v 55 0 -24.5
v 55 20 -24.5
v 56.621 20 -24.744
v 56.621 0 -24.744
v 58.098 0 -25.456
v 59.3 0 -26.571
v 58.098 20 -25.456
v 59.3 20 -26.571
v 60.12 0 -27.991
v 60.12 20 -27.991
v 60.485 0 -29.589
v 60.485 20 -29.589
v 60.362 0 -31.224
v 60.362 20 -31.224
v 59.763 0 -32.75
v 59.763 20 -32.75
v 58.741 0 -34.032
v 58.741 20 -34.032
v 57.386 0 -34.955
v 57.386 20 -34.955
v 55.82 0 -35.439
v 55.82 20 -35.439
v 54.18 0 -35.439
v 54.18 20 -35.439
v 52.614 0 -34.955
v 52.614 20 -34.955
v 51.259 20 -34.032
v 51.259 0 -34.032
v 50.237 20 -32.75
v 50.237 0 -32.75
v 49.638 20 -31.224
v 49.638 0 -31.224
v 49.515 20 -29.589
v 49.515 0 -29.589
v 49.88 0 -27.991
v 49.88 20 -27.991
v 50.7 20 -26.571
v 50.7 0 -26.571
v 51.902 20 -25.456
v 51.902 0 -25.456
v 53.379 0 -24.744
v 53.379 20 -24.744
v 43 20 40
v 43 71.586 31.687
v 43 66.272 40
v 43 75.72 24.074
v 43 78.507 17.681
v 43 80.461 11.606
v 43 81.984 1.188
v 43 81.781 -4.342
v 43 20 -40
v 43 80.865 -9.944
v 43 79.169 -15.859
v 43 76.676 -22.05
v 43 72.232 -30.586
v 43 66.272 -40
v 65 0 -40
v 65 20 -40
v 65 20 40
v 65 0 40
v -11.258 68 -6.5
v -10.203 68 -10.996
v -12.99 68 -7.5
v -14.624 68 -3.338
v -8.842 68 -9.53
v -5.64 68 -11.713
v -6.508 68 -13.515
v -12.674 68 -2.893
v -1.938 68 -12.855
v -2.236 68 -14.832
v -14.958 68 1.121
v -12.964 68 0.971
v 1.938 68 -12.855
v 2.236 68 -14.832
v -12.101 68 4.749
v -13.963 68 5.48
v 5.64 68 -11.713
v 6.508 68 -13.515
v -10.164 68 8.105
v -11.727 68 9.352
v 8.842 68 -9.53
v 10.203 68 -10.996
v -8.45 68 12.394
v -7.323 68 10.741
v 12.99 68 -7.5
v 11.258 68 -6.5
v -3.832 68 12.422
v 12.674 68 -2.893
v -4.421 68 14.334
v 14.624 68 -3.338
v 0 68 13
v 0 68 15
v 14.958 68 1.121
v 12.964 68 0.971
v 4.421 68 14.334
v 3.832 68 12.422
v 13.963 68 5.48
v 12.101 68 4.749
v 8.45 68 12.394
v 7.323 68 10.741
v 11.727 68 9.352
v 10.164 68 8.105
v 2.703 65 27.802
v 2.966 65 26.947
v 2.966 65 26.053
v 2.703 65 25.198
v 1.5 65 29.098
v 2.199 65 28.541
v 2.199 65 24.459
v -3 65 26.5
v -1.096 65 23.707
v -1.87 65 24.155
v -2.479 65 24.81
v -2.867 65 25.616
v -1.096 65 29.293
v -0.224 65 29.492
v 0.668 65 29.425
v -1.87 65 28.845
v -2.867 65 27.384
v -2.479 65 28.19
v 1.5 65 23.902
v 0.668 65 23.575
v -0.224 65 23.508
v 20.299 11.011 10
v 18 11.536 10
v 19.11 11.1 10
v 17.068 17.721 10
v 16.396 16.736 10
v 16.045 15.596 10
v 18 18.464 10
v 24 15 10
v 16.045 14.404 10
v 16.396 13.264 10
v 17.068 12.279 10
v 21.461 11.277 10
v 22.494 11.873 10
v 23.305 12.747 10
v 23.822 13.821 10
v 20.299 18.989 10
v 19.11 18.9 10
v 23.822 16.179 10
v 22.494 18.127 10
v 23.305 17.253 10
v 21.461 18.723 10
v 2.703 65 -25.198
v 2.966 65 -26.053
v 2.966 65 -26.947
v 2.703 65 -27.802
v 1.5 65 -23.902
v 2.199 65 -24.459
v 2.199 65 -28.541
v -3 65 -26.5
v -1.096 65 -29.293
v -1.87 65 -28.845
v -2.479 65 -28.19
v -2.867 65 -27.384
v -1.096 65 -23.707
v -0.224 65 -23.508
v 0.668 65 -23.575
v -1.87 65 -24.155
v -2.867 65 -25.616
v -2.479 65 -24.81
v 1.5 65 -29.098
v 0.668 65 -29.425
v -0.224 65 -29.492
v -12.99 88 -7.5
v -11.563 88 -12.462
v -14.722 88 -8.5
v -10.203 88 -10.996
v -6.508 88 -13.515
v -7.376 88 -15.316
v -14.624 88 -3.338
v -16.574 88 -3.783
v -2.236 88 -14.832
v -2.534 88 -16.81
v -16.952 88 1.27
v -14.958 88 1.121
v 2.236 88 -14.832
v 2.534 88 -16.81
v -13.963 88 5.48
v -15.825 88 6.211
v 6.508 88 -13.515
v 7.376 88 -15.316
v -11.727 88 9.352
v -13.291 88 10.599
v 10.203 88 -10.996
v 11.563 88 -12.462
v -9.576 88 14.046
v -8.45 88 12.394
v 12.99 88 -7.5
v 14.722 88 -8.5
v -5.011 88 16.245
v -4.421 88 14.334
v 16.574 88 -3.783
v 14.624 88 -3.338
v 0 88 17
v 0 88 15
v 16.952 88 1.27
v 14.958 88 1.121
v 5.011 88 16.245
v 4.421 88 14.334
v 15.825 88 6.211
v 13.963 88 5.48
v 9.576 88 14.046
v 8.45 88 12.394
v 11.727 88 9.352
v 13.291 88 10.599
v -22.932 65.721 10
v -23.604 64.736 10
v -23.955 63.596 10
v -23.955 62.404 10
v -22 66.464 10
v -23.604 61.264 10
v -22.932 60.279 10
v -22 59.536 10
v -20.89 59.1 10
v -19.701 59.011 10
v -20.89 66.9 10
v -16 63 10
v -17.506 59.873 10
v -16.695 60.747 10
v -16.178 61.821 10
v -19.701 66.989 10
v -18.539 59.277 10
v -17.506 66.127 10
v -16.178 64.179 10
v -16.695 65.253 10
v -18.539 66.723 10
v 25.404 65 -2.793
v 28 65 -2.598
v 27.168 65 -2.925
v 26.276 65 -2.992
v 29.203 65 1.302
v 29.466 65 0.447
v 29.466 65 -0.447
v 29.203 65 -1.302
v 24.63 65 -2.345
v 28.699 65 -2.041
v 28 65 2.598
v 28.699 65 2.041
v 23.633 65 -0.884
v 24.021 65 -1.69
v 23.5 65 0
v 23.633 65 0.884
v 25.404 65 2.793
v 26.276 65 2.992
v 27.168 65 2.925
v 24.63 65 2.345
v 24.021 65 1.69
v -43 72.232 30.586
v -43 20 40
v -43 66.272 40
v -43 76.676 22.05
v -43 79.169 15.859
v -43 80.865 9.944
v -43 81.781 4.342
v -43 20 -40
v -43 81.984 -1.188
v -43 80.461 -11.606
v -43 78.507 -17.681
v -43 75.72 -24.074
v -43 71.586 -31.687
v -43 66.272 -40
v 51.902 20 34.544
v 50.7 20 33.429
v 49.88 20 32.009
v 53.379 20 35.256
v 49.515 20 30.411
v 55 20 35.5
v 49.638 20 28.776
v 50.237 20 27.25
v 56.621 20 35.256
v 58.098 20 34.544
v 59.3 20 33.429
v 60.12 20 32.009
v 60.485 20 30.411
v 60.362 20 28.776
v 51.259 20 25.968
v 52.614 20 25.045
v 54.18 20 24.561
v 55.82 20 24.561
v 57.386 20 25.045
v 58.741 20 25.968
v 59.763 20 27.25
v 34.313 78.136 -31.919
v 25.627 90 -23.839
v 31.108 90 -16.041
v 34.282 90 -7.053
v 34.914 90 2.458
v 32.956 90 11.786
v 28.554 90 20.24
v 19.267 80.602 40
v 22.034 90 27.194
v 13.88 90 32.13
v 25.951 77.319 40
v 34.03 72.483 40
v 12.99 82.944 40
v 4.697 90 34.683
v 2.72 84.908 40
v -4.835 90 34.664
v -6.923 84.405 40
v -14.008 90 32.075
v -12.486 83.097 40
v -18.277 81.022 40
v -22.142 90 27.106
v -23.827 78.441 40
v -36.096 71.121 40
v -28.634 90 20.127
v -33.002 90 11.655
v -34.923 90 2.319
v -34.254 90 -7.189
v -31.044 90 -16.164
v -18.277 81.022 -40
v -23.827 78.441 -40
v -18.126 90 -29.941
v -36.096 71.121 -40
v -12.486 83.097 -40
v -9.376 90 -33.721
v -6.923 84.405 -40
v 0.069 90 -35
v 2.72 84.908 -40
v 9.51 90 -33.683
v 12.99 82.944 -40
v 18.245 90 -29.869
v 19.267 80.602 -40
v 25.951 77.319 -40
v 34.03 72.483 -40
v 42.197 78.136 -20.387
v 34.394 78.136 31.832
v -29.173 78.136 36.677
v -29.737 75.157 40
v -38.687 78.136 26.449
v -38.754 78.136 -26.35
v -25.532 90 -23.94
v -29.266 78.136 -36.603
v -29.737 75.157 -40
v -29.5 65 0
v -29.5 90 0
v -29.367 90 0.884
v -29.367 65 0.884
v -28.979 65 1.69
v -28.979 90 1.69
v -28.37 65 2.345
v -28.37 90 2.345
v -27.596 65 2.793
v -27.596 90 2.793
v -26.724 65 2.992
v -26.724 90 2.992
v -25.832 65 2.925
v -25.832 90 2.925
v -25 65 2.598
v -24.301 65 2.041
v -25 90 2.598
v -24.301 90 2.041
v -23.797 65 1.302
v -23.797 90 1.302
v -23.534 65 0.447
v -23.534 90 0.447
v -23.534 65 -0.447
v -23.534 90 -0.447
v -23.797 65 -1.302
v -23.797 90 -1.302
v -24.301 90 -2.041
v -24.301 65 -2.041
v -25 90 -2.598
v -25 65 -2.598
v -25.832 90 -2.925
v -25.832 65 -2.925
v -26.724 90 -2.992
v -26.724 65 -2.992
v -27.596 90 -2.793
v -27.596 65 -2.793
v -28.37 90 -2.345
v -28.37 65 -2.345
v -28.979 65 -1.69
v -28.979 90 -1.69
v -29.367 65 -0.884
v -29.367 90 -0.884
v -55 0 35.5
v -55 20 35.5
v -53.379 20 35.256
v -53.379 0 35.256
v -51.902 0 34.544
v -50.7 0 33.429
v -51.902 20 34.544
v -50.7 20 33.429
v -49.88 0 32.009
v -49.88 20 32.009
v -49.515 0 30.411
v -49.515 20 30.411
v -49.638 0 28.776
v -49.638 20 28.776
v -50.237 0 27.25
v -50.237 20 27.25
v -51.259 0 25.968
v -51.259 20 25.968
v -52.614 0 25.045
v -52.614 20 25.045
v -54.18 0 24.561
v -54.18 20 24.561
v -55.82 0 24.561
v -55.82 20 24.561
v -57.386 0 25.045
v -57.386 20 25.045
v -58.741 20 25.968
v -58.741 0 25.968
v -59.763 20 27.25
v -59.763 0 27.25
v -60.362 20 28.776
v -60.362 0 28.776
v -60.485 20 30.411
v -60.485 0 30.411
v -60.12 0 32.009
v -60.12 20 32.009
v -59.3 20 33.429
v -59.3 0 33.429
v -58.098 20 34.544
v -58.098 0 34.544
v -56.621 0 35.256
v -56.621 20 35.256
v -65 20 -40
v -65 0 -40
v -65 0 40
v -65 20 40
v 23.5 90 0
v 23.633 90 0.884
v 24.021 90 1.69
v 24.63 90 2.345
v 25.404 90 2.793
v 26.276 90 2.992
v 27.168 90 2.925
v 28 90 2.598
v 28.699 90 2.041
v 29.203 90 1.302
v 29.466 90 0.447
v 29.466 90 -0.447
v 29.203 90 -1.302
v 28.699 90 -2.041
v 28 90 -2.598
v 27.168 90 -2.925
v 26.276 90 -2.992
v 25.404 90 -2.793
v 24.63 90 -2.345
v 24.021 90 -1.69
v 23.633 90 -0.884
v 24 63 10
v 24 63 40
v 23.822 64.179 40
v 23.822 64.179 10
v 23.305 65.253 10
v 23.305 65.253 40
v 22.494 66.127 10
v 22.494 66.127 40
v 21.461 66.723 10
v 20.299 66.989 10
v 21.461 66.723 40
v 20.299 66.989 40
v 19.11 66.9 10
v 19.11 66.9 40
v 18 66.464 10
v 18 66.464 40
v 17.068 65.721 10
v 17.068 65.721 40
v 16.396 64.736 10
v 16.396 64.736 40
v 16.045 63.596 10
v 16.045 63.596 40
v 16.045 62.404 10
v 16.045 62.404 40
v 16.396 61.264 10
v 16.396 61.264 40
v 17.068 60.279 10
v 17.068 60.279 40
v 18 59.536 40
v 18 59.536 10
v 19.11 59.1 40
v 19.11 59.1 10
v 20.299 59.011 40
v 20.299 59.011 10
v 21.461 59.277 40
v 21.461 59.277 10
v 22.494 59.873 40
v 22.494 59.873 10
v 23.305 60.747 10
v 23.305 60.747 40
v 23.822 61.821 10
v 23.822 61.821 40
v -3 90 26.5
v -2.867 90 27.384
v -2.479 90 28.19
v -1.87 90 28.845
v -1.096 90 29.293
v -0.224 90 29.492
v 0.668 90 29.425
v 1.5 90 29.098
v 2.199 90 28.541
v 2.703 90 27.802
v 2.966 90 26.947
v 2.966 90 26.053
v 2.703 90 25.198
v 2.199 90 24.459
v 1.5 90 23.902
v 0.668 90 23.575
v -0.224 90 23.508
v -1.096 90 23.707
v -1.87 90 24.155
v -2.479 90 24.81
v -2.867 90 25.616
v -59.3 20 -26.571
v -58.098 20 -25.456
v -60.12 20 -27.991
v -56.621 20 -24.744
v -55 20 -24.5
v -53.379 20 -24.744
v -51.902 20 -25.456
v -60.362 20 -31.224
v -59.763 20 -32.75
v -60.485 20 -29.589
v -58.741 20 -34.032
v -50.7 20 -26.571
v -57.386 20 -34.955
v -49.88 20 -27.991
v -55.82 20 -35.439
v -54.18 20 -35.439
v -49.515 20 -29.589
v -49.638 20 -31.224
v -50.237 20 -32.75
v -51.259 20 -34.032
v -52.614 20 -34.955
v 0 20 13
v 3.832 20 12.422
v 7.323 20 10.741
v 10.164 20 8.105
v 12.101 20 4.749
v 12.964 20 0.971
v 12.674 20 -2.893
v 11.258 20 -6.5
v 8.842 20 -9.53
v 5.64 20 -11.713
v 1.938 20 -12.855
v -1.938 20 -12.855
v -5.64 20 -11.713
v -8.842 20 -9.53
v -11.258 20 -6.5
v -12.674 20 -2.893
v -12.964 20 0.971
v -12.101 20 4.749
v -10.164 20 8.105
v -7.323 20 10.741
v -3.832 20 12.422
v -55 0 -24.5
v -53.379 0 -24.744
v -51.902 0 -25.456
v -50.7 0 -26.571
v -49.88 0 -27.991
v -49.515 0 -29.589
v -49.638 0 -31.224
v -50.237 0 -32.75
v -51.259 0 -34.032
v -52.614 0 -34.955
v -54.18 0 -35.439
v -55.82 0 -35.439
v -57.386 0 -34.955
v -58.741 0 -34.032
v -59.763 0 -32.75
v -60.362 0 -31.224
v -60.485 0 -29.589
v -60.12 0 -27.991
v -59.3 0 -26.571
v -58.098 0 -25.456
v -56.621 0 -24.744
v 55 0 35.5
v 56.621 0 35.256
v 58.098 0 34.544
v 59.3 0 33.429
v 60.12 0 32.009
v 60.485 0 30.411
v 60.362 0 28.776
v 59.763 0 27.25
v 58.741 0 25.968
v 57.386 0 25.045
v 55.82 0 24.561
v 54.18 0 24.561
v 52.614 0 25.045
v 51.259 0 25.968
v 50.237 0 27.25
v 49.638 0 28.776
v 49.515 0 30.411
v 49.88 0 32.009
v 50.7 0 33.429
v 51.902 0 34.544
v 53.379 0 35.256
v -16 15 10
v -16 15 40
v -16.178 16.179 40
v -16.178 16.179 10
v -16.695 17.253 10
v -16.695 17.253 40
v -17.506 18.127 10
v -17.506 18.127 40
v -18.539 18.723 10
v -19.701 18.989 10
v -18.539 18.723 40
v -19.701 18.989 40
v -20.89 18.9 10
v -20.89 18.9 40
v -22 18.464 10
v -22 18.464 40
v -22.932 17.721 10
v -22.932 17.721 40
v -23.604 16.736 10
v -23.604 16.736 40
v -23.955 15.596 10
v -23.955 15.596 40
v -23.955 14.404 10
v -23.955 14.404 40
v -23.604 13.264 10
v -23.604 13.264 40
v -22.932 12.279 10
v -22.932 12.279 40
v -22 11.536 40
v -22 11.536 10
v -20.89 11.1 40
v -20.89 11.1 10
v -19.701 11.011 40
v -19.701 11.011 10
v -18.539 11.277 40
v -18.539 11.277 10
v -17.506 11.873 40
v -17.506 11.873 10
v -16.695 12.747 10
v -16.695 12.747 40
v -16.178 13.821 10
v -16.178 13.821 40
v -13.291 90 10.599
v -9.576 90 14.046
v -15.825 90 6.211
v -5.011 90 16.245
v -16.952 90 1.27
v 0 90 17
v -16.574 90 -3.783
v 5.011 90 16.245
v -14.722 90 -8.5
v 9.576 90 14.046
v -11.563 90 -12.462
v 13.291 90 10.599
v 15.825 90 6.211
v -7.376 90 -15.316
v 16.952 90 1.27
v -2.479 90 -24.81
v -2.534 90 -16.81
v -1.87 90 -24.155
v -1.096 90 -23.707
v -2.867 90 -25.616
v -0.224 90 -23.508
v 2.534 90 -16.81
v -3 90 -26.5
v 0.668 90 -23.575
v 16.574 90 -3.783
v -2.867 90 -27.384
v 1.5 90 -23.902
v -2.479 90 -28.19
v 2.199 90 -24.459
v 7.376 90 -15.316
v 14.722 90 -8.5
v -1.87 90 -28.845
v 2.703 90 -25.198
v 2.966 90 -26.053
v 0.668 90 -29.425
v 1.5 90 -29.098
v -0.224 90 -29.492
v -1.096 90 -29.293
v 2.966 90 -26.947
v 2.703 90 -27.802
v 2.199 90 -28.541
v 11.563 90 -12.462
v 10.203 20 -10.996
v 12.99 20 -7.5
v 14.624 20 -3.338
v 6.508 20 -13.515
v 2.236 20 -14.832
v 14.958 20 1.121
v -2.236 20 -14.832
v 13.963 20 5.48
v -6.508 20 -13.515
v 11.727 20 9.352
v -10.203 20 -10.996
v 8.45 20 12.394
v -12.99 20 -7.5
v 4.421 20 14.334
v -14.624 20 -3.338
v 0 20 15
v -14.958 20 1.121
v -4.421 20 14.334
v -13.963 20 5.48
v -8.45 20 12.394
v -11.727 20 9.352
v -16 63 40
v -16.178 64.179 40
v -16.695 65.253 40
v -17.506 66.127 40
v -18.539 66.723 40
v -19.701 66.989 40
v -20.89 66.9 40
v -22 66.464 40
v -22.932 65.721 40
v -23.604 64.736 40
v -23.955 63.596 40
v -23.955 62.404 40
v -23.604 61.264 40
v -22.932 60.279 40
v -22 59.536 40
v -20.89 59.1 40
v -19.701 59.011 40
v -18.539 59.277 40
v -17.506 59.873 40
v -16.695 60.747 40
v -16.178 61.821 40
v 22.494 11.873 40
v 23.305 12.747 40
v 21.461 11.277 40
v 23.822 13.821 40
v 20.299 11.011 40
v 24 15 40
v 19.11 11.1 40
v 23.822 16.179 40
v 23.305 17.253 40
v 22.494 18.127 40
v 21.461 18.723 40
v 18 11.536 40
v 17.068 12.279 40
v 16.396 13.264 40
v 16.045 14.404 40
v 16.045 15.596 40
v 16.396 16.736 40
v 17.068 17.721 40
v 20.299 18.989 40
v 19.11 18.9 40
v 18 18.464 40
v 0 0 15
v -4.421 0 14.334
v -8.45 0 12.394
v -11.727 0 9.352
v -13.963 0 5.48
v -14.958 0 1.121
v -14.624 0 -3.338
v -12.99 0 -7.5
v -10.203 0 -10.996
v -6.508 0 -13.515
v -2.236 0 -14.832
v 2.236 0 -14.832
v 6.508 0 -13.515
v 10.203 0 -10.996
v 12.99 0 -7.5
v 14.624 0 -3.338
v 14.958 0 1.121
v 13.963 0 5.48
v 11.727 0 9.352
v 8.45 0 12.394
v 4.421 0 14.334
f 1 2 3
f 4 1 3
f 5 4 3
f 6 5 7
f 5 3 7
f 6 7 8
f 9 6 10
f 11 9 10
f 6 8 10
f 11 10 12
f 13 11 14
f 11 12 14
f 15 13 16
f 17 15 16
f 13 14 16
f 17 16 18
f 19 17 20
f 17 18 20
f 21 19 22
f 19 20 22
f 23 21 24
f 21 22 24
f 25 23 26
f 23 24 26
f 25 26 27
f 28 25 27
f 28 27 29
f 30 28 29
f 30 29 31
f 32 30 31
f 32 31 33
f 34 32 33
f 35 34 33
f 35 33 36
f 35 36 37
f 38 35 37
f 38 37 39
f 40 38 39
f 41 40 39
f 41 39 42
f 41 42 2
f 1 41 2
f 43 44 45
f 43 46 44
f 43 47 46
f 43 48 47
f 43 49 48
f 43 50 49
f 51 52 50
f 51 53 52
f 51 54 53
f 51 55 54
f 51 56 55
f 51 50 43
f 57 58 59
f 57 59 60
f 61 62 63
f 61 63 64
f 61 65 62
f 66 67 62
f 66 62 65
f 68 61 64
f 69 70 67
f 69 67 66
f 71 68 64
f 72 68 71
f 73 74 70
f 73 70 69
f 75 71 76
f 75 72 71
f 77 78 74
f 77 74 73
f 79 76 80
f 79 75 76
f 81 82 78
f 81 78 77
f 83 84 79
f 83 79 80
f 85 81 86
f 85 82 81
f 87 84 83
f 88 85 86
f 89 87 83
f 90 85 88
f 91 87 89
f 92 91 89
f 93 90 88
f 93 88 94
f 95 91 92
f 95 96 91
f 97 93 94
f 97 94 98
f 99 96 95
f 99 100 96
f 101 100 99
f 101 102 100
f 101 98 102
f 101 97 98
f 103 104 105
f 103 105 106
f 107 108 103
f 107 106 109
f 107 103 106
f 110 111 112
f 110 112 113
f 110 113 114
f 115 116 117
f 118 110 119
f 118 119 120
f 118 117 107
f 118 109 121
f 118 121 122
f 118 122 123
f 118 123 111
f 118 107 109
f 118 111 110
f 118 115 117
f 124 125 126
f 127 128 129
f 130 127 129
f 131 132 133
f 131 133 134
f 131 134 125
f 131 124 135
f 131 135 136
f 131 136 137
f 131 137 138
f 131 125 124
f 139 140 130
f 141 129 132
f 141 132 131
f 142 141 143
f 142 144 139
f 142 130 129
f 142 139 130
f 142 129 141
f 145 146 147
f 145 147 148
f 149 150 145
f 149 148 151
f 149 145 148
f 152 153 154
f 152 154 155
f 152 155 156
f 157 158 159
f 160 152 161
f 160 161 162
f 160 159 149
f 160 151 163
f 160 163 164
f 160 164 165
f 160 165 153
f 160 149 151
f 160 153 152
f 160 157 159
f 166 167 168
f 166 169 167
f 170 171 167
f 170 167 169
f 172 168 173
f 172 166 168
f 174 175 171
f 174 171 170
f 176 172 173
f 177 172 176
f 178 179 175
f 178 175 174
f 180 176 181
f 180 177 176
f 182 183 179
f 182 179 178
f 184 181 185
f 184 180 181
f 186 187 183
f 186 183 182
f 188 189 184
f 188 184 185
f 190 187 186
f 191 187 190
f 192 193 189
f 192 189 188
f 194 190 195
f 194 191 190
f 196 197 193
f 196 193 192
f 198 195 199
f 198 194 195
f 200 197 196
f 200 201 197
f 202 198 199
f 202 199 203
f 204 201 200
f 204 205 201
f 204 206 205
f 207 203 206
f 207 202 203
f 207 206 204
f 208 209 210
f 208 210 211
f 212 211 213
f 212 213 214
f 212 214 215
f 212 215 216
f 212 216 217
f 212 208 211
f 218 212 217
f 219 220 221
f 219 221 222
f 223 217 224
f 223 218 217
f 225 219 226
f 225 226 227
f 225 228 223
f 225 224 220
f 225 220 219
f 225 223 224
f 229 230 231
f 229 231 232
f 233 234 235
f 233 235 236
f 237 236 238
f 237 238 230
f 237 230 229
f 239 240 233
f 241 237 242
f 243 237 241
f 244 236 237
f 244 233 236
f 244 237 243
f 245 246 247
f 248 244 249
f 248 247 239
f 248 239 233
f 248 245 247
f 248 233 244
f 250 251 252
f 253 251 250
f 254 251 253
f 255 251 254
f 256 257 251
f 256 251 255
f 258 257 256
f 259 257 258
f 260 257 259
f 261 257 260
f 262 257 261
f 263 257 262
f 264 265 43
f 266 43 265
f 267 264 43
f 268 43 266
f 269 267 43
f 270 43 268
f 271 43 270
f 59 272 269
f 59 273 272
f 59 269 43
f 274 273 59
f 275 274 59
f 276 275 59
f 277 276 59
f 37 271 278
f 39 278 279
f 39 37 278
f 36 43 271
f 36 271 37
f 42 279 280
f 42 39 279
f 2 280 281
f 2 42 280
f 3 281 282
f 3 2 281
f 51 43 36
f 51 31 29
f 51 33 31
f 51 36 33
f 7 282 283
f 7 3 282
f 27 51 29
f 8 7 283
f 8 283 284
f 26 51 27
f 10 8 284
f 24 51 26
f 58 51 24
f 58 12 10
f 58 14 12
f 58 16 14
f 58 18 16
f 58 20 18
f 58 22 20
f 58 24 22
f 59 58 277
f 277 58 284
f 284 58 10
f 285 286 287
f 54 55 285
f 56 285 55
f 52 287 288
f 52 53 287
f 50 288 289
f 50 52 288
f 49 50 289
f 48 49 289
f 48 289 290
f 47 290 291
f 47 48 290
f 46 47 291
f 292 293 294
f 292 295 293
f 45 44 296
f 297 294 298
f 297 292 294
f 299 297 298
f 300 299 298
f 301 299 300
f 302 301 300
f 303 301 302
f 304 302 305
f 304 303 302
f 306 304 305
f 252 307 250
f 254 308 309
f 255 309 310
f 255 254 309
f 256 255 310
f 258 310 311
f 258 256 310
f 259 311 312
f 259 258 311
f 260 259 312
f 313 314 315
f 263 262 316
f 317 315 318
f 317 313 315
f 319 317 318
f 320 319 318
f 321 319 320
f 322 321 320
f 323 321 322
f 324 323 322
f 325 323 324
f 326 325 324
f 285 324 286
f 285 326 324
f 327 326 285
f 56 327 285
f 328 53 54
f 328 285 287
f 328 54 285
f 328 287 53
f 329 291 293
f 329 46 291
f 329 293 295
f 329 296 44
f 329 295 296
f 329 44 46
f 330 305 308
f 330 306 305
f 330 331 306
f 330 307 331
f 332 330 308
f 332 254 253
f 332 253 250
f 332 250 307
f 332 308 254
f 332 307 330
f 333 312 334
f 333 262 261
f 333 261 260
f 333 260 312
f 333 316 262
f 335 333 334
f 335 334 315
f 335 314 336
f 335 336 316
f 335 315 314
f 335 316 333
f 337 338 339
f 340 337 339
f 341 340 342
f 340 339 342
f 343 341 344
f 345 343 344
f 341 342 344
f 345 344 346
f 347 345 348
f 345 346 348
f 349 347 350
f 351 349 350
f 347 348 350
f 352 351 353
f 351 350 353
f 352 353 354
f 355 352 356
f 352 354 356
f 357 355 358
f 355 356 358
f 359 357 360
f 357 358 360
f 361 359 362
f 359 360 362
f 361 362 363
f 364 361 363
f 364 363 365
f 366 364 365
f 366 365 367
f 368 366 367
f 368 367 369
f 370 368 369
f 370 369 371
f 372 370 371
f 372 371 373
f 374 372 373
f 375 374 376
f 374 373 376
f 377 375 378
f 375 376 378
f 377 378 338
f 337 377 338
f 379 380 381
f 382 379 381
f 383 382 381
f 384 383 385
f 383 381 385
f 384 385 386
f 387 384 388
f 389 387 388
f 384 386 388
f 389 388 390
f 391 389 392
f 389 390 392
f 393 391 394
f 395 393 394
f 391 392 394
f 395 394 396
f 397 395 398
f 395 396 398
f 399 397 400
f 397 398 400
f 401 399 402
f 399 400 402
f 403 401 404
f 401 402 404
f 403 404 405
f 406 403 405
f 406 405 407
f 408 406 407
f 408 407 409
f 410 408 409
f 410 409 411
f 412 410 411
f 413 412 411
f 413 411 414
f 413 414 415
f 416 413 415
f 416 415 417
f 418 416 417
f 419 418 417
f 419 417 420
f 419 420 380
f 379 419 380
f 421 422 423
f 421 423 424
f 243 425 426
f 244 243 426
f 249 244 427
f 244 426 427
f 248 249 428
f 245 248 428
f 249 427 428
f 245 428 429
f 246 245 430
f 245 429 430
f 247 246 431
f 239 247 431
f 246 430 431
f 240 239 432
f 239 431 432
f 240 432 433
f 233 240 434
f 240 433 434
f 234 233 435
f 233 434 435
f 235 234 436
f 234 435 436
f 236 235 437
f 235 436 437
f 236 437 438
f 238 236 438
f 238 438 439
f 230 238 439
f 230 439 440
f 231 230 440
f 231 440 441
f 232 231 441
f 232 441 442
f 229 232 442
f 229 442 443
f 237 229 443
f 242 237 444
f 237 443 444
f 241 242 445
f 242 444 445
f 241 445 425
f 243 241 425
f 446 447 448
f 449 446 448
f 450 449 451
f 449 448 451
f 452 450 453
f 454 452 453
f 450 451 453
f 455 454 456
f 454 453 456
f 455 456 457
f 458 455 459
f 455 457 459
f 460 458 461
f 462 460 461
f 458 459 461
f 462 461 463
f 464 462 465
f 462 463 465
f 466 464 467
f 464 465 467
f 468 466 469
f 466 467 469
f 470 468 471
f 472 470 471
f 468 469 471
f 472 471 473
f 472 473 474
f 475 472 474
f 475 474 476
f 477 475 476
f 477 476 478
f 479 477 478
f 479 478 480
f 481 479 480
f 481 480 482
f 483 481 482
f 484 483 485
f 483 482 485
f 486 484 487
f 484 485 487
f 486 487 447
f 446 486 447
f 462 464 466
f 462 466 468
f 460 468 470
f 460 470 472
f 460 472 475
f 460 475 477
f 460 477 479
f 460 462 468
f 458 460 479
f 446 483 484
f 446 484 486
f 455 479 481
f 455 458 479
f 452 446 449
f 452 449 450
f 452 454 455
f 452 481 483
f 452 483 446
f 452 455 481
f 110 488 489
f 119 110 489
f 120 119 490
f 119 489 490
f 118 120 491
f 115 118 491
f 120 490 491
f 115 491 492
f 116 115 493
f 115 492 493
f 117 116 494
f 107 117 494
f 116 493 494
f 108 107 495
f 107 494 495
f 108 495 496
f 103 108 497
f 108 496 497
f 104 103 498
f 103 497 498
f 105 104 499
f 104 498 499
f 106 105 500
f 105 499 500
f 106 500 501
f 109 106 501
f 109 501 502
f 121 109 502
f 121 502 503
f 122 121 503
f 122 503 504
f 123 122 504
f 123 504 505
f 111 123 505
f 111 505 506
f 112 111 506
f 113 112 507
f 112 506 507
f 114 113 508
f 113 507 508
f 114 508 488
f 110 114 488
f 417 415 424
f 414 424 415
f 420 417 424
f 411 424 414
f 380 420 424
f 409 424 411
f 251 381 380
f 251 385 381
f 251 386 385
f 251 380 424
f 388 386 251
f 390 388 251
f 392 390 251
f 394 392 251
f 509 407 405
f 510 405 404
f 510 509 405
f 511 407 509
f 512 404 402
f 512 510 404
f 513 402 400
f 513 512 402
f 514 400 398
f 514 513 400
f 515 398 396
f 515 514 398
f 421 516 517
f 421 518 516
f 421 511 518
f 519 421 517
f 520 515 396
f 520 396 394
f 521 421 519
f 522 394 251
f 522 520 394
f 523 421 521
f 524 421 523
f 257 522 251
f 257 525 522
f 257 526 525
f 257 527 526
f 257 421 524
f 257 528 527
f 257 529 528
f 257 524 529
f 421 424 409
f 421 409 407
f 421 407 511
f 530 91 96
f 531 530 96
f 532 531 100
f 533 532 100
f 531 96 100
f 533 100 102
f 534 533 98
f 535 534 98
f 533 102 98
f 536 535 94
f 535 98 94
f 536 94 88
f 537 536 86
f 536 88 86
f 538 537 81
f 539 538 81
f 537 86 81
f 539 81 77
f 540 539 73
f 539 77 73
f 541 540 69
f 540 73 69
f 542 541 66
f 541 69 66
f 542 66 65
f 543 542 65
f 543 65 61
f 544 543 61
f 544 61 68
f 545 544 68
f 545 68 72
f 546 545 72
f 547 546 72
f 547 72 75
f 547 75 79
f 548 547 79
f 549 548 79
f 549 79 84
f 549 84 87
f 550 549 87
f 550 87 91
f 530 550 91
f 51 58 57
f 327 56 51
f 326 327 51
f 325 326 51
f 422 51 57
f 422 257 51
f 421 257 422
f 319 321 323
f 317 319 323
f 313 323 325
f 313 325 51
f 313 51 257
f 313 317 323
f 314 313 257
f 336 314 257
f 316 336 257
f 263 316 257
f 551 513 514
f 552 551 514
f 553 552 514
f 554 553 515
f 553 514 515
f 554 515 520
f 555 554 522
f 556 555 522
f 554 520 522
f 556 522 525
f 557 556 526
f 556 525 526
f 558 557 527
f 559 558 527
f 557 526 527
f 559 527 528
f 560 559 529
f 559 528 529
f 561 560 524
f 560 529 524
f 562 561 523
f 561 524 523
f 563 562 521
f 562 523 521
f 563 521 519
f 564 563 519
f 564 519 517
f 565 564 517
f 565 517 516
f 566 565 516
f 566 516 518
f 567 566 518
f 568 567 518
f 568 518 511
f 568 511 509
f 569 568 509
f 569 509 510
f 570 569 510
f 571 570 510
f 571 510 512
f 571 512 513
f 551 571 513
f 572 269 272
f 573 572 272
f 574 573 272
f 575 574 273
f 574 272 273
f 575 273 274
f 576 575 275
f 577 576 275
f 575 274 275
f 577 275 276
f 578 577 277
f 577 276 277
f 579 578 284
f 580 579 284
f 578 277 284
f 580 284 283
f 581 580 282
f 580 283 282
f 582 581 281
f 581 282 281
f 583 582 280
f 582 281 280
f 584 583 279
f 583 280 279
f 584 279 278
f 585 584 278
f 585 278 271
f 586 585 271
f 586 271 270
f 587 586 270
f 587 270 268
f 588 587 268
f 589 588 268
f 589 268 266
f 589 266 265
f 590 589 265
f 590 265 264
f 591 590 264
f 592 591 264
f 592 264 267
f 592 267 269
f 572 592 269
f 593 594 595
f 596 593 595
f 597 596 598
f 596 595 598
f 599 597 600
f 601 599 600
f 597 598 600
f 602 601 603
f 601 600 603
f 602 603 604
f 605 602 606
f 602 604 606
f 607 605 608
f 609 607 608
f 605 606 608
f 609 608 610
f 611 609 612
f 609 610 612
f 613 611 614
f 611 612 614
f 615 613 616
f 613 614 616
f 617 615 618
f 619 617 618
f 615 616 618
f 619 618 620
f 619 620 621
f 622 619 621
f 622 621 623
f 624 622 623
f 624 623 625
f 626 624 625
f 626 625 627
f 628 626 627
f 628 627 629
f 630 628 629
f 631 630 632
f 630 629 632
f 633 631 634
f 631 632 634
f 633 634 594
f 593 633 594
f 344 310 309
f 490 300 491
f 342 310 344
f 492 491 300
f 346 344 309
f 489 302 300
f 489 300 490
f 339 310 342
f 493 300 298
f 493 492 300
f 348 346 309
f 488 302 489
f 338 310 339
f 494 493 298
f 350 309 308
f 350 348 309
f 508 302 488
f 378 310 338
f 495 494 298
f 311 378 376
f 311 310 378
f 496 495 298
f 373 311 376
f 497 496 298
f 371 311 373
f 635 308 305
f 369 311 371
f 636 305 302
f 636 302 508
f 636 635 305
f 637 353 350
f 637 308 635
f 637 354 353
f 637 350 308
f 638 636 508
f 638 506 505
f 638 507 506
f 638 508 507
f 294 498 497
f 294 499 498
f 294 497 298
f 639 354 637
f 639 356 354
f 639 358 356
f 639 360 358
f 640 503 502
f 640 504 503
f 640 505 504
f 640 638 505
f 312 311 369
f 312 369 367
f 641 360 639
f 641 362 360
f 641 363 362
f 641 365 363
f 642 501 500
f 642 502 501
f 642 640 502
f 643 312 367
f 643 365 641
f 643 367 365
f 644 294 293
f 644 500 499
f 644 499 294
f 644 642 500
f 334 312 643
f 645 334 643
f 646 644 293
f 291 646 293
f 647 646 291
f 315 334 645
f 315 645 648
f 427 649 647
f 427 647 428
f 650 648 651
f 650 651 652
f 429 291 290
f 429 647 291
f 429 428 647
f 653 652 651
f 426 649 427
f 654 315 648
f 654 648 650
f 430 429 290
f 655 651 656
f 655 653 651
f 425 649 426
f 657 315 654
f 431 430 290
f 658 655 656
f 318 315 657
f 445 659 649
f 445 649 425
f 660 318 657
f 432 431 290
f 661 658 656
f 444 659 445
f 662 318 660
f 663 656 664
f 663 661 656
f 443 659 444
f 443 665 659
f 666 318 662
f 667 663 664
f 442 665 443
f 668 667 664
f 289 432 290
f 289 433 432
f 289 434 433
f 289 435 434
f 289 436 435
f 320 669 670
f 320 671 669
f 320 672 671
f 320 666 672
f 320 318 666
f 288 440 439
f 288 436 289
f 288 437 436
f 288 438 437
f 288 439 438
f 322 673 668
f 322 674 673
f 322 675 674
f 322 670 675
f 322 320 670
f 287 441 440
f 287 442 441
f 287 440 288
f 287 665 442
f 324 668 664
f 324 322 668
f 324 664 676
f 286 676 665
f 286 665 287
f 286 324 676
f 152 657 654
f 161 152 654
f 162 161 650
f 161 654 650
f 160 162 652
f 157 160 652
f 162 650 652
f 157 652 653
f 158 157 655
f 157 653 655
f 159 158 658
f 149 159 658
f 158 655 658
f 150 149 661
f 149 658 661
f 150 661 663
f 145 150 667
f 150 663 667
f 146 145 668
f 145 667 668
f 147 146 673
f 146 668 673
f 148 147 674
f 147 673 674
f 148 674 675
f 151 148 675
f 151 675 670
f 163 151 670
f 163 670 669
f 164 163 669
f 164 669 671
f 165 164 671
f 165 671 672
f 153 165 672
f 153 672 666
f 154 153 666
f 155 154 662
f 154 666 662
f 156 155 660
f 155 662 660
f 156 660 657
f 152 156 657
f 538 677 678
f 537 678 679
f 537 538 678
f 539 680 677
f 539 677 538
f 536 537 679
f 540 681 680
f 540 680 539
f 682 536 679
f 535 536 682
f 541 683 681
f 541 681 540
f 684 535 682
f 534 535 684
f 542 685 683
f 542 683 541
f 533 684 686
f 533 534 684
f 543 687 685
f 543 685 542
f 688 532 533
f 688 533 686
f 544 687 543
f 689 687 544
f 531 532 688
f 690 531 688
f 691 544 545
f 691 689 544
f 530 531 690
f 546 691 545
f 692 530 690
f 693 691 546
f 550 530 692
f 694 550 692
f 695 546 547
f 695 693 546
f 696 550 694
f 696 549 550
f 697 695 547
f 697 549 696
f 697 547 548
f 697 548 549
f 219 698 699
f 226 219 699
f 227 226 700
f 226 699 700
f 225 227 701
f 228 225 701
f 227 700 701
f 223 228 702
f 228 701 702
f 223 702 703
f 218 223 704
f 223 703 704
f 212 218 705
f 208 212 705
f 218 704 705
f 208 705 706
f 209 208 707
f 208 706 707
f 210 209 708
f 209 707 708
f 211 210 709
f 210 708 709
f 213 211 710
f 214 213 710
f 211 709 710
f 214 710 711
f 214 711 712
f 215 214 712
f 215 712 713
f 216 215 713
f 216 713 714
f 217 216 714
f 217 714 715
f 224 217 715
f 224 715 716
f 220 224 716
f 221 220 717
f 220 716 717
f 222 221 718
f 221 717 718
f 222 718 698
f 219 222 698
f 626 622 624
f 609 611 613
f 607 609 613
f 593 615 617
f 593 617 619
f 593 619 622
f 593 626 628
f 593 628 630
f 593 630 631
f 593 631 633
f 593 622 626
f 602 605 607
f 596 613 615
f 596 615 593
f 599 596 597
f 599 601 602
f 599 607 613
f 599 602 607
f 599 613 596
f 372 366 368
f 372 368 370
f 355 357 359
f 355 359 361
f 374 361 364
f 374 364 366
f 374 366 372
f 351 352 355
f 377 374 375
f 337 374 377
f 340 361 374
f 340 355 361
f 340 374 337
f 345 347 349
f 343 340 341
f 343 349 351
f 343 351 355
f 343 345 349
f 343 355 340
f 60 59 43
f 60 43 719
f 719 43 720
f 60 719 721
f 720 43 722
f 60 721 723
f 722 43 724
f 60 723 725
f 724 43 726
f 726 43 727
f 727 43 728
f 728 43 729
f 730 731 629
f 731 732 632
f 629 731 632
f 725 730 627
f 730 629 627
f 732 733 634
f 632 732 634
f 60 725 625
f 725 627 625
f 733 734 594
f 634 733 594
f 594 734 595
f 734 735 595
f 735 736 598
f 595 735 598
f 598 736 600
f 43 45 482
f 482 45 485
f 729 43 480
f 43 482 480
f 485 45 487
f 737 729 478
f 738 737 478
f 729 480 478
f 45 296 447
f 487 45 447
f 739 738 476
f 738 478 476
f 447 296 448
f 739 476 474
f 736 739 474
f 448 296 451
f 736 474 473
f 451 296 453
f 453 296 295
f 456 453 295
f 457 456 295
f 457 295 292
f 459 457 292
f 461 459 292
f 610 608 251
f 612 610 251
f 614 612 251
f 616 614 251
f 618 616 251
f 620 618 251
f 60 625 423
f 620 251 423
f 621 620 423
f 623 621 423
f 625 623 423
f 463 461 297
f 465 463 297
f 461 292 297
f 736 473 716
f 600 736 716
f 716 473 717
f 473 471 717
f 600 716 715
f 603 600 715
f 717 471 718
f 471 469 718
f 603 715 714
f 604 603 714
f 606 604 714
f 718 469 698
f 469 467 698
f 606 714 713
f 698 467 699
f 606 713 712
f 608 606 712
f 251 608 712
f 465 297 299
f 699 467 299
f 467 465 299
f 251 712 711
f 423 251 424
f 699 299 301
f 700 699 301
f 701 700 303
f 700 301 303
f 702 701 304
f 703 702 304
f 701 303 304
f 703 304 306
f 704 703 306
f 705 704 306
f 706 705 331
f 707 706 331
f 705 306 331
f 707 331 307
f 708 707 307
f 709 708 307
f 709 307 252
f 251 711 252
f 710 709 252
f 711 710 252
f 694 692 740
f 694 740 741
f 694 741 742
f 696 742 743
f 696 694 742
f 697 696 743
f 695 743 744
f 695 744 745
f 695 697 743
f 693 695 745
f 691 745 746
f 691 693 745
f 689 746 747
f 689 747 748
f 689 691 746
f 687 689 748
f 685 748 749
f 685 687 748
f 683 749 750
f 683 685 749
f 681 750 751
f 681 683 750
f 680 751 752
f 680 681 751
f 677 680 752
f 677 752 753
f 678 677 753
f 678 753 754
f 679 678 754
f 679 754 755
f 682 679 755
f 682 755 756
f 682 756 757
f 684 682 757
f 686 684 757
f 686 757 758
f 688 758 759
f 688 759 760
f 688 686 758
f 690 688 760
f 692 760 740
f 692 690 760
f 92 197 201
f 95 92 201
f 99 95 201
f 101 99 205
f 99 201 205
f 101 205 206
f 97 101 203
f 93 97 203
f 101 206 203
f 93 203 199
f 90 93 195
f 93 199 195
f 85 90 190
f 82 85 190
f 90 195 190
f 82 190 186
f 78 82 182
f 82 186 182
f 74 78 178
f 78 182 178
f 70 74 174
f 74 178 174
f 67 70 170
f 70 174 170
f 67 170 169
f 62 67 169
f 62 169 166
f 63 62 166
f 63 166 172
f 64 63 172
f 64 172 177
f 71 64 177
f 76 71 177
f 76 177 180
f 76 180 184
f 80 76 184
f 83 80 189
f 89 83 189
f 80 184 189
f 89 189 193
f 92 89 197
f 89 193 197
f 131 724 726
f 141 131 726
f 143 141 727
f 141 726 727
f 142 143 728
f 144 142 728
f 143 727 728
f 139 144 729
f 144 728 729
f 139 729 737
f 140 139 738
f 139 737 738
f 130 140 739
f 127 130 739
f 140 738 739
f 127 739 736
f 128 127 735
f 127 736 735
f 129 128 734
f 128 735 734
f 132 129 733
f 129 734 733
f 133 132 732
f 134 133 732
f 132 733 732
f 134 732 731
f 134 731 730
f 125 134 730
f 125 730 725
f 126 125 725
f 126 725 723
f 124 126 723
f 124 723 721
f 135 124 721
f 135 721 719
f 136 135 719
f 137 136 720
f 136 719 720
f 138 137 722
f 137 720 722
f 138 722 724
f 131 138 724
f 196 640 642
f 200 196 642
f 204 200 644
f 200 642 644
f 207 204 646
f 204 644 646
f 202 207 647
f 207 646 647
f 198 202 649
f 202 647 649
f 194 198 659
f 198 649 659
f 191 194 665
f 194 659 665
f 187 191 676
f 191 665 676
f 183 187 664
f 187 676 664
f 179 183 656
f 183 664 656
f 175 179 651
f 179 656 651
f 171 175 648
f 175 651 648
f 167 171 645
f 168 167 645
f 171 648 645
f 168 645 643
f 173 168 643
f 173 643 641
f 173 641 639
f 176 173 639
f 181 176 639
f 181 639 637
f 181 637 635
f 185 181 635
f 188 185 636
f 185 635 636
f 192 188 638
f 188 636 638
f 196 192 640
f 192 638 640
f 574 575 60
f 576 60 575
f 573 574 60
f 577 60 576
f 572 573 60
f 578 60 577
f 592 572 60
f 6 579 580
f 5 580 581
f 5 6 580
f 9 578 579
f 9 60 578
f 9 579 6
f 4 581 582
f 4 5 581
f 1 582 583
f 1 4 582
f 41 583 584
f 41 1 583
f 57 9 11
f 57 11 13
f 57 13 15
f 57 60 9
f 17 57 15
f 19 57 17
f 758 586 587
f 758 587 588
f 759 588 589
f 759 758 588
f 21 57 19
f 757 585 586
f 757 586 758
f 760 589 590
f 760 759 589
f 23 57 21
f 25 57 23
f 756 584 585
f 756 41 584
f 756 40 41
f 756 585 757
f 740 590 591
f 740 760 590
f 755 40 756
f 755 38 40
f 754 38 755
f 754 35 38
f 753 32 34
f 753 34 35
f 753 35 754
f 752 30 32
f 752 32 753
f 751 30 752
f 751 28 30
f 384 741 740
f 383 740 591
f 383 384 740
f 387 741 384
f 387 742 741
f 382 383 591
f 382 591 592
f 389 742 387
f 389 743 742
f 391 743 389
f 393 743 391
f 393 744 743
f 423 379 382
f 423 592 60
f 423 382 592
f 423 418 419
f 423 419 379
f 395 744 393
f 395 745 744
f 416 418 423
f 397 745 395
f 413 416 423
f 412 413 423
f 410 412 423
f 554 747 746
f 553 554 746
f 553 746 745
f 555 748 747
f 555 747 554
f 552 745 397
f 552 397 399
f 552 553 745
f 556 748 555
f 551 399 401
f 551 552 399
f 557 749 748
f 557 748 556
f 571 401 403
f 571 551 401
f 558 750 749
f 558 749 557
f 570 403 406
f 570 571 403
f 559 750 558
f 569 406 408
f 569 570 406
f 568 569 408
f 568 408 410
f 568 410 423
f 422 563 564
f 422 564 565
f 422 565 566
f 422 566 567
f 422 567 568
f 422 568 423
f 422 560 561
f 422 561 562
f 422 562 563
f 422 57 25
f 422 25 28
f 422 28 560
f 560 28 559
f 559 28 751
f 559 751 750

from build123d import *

# Parameters (mm, degrees)
SALIENTE_EXTRUIR1_DEPTH      = 40
SALIENTE_EXTRUIR1_DEPTH_BACK = 40
CROQUIS2_R                   = 17
CORTAR_EXTRUIR1_DEPTH        = 2
CORTAR_EXTRUIR2_REACH        = 118.486
CROQUIS5_R                   = 13
CROQUIS6_R                   = 15
CORTAR_EXTRUIR3_DEPTH        = 20
CORTAR_EXTRUIR4_START        = -20
CROQUIS7_R                   = 15
CORTAR_EXTRUIR4_DEPTH        = 20
CORTAR_EXTRUIR6_REACH        = 105.562
CROQUIS8_R                   = 5.5
CROQUIS9_R                   = 4
CORTAR_EXTRUIR7_DEPTH        = 30
CROQUIS10_R                  = 3
CORTAR_EXTRUIR8_DEPTH        = 25


with BuildPart() as part:
    # Croquis1 → Saliente-Extruir1 (new, two sides: drawn at the far end of the back side and taken through both)
    with BuildSketch(Plane.XY.offset(-SALIENTE_EXTRUIR1_DEPTH_BACK)):
        Polygon((65, 0), (-65, 0), (-65, 20), (-43, 20), (-43, 90), (43, 90), (43, 20), (65, 20), align=None)
    extrude(amount=SALIENTE_EXTRUIR1_DEPTH + SALIENTE_EXTRUIR1_DEPTH_BACK)

    # Croquis2 → Cortar-Extruir1 (cut)
    with BuildSketch(Plane(origin=(0, 90, 0), x_dir=(1, 0, 0), z_dir=(0, 1, 0))):
        Circle(CROQUIS2_R)
    extrude(amount=-CORTAR_EXTRUIR1_DEPTH, mode=Mode.SUBTRACT)

    # Croquis4 → Cortar-Revolución2 (revolve, cut)
    with BuildSketch(Plane.XY):
        Polygon((-35, 90), (-75.552498824, 49.447501176), (-75.552498824, 90), align=None)
    revolve(axis=Axis((0, 0, 0), (0, -1, 0)), mode=Mode.SUBTRACT)

    # Croquis5 → Cortar-Extruir2 (cut, up to next)
    with BuildSketch(Plane(origin=(0, 88, 0), x_dir=(1, 0, 0), z_dir=(0, 1, 0)), mode=Mode.PRIVATE) as cortar_extruir2_sk1:
        Circle(CROQUIS5_R)
    cortar_extruir2_tool1 = extrude(cortar_extruir2_sk1.sketch, amount=-CORTAR_EXTRUIR2_REACH, mode=Mode.PRIVATE) & part.part
    add(cortar_extruir2_tool1.solids().sort_by_distance((0, 88, 0))[0], mode=Mode.SUBTRACT)

    # Croquis6 → Cortar-Extruir3 (cut)
    with BuildSketch(Plane(origin=(0, 88, 0), x_dir=(1, 0, 0), z_dir=(0, 1, 0))):
        Circle(CROQUIS6_R)
    extrude(amount=-CORTAR_EXTRUIR3_DEPTH, mode=Mode.SUBTRACT)

    # Croquis7 → Cortar-Extruir4 (cut)
    with BuildSketch(Plane.XZ.offset(CORTAR_EXTRUIR4_START)):
        Circle(CROQUIS7_R)
    extrude(amount=CORTAR_EXTRUIR4_DEPTH, mode=Mode.SUBTRACT)

    # Croquis8 → Cortar-Extruir6 (cut, up to next)
    with BuildSketch(Plane(origin=(0, 20, 0), x_dir=(1, 0, 0), z_dir=(0, 1, 0)), mode=Mode.PRIVATE) as cortar_extruir6_sk1:
        with Locations((-55, 30)):
            Circle(CROQUIS8_R)
    cortar_extruir6_tool1 = extrude(cortar_extruir6_sk1.sketch, amount=-CORTAR_EXTRUIR6_REACH, mode=Mode.PRIVATE) & part.part
    # Croquis8 → Cortar-Extruir6 (cut, up to next)
    with BuildSketch(Plane(origin=(0, 20, 0), x_dir=(1, 0, 0), z_dir=(0, 1, 0)), mode=Mode.PRIVATE) as cortar_extruir6_sk2:
        with Locations((-55, -30)):
            Circle(CROQUIS8_R)
    cortar_extruir6_tool2 = extrude(cortar_extruir6_sk2.sketch, amount=-CORTAR_EXTRUIR6_REACH, mode=Mode.PRIVATE) & part.part
    # Croquis8 → Cortar-Extruir6 (cut, up to next)
    with BuildSketch(Plane(origin=(0, 20, 0), x_dir=(1, 0, 0), z_dir=(0, 1, 0)), mode=Mode.PRIVATE) as cortar_extruir6_sk3:
        with Locations((55, 30)):
            Circle(CROQUIS8_R)
    cortar_extruir6_tool3 = extrude(cortar_extruir6_sk3.sketch, amount=-CORTAR_EXTRUIR6_REACH, mode=Mode.PRIVATE) & part.part
    # Croquis8 → Cortar-Extruir6 (cut, up to next)
    with BuildSketch(Plane(origin=(0, 20, 0), x_dir=(1, 0, 0), z_dir=(0, 1, 0)), mode=Mode.PRIVATE) as cortar_extruir6_sk4:
        with Locations((55, -30)):
            Circle(CROQUIS8_R)
    cortar_extruir6_tool4 = extrude(cortar_extruir6_sk4.sketch, amount=-CORTAR_EXTRUIR6_REACH, mode=Mode.PRIVATE) & part.part
    add(cortar_extruir6_tool1.solids().sort_by_distance((-55, 20, -30))[0], mode=Mode.SUBTRACT)
    add(cortar_extruir6_tool2.solids().sort_by_distance((-55, 20, 30))[0], mode=Mode.SUBTRACT)
    add(cortar_extruir6_tool3.solids().sort_by_distance((55, 20, -30))[0], mode=Mode.SUBTRACT)
    add(cortar_extruir6_tool4.solids().sort_by_distance((55, 20, 30))[0], mode=Mode.SUBTRACT)

    # Croquis9 → Cortar-Extruir7 (cut)
    with BuildSketch(Plane.XY.offset(40)):
        with Locations((-20, 63)):
            Circle(CROQUIS9_R)
        with Locations((20, 63)):
            Circle(CROQUIS9_R)
        with Locations((20, 15)):
            Circle(CROQUIS9_R)
        with Locations((-20, 15)):
            Circle(CROQUIS9_R)
    extrude(amount=-CORTAR_EXTRUIR7_DEPTH, mode=Mode.SUBTRACT)

    # Croquis10 → Cortar-Extruir8 (cut)
    with BuildSketch(Plane(origin=(0, 90, 0), x_dir=(1, 0, 0), z_dir=(0, 1, 0))):
        with Locations((0, 26.5)):
            Circle(CROQUIS10_R)
        with Locations((26.5, 0)):
            Circle(CROQUIS10_R)
        with Locations((0, -26.5)):
            Circle(CROQUIS10_R)
        with Locations((-26.5, 0)):
            Circle(CROQUIS10_R)
    extrude(amount=-CORTAR_EXTRUIR8_DEPTH, mode=Mode.SUBTRACT)


solid = part.part
